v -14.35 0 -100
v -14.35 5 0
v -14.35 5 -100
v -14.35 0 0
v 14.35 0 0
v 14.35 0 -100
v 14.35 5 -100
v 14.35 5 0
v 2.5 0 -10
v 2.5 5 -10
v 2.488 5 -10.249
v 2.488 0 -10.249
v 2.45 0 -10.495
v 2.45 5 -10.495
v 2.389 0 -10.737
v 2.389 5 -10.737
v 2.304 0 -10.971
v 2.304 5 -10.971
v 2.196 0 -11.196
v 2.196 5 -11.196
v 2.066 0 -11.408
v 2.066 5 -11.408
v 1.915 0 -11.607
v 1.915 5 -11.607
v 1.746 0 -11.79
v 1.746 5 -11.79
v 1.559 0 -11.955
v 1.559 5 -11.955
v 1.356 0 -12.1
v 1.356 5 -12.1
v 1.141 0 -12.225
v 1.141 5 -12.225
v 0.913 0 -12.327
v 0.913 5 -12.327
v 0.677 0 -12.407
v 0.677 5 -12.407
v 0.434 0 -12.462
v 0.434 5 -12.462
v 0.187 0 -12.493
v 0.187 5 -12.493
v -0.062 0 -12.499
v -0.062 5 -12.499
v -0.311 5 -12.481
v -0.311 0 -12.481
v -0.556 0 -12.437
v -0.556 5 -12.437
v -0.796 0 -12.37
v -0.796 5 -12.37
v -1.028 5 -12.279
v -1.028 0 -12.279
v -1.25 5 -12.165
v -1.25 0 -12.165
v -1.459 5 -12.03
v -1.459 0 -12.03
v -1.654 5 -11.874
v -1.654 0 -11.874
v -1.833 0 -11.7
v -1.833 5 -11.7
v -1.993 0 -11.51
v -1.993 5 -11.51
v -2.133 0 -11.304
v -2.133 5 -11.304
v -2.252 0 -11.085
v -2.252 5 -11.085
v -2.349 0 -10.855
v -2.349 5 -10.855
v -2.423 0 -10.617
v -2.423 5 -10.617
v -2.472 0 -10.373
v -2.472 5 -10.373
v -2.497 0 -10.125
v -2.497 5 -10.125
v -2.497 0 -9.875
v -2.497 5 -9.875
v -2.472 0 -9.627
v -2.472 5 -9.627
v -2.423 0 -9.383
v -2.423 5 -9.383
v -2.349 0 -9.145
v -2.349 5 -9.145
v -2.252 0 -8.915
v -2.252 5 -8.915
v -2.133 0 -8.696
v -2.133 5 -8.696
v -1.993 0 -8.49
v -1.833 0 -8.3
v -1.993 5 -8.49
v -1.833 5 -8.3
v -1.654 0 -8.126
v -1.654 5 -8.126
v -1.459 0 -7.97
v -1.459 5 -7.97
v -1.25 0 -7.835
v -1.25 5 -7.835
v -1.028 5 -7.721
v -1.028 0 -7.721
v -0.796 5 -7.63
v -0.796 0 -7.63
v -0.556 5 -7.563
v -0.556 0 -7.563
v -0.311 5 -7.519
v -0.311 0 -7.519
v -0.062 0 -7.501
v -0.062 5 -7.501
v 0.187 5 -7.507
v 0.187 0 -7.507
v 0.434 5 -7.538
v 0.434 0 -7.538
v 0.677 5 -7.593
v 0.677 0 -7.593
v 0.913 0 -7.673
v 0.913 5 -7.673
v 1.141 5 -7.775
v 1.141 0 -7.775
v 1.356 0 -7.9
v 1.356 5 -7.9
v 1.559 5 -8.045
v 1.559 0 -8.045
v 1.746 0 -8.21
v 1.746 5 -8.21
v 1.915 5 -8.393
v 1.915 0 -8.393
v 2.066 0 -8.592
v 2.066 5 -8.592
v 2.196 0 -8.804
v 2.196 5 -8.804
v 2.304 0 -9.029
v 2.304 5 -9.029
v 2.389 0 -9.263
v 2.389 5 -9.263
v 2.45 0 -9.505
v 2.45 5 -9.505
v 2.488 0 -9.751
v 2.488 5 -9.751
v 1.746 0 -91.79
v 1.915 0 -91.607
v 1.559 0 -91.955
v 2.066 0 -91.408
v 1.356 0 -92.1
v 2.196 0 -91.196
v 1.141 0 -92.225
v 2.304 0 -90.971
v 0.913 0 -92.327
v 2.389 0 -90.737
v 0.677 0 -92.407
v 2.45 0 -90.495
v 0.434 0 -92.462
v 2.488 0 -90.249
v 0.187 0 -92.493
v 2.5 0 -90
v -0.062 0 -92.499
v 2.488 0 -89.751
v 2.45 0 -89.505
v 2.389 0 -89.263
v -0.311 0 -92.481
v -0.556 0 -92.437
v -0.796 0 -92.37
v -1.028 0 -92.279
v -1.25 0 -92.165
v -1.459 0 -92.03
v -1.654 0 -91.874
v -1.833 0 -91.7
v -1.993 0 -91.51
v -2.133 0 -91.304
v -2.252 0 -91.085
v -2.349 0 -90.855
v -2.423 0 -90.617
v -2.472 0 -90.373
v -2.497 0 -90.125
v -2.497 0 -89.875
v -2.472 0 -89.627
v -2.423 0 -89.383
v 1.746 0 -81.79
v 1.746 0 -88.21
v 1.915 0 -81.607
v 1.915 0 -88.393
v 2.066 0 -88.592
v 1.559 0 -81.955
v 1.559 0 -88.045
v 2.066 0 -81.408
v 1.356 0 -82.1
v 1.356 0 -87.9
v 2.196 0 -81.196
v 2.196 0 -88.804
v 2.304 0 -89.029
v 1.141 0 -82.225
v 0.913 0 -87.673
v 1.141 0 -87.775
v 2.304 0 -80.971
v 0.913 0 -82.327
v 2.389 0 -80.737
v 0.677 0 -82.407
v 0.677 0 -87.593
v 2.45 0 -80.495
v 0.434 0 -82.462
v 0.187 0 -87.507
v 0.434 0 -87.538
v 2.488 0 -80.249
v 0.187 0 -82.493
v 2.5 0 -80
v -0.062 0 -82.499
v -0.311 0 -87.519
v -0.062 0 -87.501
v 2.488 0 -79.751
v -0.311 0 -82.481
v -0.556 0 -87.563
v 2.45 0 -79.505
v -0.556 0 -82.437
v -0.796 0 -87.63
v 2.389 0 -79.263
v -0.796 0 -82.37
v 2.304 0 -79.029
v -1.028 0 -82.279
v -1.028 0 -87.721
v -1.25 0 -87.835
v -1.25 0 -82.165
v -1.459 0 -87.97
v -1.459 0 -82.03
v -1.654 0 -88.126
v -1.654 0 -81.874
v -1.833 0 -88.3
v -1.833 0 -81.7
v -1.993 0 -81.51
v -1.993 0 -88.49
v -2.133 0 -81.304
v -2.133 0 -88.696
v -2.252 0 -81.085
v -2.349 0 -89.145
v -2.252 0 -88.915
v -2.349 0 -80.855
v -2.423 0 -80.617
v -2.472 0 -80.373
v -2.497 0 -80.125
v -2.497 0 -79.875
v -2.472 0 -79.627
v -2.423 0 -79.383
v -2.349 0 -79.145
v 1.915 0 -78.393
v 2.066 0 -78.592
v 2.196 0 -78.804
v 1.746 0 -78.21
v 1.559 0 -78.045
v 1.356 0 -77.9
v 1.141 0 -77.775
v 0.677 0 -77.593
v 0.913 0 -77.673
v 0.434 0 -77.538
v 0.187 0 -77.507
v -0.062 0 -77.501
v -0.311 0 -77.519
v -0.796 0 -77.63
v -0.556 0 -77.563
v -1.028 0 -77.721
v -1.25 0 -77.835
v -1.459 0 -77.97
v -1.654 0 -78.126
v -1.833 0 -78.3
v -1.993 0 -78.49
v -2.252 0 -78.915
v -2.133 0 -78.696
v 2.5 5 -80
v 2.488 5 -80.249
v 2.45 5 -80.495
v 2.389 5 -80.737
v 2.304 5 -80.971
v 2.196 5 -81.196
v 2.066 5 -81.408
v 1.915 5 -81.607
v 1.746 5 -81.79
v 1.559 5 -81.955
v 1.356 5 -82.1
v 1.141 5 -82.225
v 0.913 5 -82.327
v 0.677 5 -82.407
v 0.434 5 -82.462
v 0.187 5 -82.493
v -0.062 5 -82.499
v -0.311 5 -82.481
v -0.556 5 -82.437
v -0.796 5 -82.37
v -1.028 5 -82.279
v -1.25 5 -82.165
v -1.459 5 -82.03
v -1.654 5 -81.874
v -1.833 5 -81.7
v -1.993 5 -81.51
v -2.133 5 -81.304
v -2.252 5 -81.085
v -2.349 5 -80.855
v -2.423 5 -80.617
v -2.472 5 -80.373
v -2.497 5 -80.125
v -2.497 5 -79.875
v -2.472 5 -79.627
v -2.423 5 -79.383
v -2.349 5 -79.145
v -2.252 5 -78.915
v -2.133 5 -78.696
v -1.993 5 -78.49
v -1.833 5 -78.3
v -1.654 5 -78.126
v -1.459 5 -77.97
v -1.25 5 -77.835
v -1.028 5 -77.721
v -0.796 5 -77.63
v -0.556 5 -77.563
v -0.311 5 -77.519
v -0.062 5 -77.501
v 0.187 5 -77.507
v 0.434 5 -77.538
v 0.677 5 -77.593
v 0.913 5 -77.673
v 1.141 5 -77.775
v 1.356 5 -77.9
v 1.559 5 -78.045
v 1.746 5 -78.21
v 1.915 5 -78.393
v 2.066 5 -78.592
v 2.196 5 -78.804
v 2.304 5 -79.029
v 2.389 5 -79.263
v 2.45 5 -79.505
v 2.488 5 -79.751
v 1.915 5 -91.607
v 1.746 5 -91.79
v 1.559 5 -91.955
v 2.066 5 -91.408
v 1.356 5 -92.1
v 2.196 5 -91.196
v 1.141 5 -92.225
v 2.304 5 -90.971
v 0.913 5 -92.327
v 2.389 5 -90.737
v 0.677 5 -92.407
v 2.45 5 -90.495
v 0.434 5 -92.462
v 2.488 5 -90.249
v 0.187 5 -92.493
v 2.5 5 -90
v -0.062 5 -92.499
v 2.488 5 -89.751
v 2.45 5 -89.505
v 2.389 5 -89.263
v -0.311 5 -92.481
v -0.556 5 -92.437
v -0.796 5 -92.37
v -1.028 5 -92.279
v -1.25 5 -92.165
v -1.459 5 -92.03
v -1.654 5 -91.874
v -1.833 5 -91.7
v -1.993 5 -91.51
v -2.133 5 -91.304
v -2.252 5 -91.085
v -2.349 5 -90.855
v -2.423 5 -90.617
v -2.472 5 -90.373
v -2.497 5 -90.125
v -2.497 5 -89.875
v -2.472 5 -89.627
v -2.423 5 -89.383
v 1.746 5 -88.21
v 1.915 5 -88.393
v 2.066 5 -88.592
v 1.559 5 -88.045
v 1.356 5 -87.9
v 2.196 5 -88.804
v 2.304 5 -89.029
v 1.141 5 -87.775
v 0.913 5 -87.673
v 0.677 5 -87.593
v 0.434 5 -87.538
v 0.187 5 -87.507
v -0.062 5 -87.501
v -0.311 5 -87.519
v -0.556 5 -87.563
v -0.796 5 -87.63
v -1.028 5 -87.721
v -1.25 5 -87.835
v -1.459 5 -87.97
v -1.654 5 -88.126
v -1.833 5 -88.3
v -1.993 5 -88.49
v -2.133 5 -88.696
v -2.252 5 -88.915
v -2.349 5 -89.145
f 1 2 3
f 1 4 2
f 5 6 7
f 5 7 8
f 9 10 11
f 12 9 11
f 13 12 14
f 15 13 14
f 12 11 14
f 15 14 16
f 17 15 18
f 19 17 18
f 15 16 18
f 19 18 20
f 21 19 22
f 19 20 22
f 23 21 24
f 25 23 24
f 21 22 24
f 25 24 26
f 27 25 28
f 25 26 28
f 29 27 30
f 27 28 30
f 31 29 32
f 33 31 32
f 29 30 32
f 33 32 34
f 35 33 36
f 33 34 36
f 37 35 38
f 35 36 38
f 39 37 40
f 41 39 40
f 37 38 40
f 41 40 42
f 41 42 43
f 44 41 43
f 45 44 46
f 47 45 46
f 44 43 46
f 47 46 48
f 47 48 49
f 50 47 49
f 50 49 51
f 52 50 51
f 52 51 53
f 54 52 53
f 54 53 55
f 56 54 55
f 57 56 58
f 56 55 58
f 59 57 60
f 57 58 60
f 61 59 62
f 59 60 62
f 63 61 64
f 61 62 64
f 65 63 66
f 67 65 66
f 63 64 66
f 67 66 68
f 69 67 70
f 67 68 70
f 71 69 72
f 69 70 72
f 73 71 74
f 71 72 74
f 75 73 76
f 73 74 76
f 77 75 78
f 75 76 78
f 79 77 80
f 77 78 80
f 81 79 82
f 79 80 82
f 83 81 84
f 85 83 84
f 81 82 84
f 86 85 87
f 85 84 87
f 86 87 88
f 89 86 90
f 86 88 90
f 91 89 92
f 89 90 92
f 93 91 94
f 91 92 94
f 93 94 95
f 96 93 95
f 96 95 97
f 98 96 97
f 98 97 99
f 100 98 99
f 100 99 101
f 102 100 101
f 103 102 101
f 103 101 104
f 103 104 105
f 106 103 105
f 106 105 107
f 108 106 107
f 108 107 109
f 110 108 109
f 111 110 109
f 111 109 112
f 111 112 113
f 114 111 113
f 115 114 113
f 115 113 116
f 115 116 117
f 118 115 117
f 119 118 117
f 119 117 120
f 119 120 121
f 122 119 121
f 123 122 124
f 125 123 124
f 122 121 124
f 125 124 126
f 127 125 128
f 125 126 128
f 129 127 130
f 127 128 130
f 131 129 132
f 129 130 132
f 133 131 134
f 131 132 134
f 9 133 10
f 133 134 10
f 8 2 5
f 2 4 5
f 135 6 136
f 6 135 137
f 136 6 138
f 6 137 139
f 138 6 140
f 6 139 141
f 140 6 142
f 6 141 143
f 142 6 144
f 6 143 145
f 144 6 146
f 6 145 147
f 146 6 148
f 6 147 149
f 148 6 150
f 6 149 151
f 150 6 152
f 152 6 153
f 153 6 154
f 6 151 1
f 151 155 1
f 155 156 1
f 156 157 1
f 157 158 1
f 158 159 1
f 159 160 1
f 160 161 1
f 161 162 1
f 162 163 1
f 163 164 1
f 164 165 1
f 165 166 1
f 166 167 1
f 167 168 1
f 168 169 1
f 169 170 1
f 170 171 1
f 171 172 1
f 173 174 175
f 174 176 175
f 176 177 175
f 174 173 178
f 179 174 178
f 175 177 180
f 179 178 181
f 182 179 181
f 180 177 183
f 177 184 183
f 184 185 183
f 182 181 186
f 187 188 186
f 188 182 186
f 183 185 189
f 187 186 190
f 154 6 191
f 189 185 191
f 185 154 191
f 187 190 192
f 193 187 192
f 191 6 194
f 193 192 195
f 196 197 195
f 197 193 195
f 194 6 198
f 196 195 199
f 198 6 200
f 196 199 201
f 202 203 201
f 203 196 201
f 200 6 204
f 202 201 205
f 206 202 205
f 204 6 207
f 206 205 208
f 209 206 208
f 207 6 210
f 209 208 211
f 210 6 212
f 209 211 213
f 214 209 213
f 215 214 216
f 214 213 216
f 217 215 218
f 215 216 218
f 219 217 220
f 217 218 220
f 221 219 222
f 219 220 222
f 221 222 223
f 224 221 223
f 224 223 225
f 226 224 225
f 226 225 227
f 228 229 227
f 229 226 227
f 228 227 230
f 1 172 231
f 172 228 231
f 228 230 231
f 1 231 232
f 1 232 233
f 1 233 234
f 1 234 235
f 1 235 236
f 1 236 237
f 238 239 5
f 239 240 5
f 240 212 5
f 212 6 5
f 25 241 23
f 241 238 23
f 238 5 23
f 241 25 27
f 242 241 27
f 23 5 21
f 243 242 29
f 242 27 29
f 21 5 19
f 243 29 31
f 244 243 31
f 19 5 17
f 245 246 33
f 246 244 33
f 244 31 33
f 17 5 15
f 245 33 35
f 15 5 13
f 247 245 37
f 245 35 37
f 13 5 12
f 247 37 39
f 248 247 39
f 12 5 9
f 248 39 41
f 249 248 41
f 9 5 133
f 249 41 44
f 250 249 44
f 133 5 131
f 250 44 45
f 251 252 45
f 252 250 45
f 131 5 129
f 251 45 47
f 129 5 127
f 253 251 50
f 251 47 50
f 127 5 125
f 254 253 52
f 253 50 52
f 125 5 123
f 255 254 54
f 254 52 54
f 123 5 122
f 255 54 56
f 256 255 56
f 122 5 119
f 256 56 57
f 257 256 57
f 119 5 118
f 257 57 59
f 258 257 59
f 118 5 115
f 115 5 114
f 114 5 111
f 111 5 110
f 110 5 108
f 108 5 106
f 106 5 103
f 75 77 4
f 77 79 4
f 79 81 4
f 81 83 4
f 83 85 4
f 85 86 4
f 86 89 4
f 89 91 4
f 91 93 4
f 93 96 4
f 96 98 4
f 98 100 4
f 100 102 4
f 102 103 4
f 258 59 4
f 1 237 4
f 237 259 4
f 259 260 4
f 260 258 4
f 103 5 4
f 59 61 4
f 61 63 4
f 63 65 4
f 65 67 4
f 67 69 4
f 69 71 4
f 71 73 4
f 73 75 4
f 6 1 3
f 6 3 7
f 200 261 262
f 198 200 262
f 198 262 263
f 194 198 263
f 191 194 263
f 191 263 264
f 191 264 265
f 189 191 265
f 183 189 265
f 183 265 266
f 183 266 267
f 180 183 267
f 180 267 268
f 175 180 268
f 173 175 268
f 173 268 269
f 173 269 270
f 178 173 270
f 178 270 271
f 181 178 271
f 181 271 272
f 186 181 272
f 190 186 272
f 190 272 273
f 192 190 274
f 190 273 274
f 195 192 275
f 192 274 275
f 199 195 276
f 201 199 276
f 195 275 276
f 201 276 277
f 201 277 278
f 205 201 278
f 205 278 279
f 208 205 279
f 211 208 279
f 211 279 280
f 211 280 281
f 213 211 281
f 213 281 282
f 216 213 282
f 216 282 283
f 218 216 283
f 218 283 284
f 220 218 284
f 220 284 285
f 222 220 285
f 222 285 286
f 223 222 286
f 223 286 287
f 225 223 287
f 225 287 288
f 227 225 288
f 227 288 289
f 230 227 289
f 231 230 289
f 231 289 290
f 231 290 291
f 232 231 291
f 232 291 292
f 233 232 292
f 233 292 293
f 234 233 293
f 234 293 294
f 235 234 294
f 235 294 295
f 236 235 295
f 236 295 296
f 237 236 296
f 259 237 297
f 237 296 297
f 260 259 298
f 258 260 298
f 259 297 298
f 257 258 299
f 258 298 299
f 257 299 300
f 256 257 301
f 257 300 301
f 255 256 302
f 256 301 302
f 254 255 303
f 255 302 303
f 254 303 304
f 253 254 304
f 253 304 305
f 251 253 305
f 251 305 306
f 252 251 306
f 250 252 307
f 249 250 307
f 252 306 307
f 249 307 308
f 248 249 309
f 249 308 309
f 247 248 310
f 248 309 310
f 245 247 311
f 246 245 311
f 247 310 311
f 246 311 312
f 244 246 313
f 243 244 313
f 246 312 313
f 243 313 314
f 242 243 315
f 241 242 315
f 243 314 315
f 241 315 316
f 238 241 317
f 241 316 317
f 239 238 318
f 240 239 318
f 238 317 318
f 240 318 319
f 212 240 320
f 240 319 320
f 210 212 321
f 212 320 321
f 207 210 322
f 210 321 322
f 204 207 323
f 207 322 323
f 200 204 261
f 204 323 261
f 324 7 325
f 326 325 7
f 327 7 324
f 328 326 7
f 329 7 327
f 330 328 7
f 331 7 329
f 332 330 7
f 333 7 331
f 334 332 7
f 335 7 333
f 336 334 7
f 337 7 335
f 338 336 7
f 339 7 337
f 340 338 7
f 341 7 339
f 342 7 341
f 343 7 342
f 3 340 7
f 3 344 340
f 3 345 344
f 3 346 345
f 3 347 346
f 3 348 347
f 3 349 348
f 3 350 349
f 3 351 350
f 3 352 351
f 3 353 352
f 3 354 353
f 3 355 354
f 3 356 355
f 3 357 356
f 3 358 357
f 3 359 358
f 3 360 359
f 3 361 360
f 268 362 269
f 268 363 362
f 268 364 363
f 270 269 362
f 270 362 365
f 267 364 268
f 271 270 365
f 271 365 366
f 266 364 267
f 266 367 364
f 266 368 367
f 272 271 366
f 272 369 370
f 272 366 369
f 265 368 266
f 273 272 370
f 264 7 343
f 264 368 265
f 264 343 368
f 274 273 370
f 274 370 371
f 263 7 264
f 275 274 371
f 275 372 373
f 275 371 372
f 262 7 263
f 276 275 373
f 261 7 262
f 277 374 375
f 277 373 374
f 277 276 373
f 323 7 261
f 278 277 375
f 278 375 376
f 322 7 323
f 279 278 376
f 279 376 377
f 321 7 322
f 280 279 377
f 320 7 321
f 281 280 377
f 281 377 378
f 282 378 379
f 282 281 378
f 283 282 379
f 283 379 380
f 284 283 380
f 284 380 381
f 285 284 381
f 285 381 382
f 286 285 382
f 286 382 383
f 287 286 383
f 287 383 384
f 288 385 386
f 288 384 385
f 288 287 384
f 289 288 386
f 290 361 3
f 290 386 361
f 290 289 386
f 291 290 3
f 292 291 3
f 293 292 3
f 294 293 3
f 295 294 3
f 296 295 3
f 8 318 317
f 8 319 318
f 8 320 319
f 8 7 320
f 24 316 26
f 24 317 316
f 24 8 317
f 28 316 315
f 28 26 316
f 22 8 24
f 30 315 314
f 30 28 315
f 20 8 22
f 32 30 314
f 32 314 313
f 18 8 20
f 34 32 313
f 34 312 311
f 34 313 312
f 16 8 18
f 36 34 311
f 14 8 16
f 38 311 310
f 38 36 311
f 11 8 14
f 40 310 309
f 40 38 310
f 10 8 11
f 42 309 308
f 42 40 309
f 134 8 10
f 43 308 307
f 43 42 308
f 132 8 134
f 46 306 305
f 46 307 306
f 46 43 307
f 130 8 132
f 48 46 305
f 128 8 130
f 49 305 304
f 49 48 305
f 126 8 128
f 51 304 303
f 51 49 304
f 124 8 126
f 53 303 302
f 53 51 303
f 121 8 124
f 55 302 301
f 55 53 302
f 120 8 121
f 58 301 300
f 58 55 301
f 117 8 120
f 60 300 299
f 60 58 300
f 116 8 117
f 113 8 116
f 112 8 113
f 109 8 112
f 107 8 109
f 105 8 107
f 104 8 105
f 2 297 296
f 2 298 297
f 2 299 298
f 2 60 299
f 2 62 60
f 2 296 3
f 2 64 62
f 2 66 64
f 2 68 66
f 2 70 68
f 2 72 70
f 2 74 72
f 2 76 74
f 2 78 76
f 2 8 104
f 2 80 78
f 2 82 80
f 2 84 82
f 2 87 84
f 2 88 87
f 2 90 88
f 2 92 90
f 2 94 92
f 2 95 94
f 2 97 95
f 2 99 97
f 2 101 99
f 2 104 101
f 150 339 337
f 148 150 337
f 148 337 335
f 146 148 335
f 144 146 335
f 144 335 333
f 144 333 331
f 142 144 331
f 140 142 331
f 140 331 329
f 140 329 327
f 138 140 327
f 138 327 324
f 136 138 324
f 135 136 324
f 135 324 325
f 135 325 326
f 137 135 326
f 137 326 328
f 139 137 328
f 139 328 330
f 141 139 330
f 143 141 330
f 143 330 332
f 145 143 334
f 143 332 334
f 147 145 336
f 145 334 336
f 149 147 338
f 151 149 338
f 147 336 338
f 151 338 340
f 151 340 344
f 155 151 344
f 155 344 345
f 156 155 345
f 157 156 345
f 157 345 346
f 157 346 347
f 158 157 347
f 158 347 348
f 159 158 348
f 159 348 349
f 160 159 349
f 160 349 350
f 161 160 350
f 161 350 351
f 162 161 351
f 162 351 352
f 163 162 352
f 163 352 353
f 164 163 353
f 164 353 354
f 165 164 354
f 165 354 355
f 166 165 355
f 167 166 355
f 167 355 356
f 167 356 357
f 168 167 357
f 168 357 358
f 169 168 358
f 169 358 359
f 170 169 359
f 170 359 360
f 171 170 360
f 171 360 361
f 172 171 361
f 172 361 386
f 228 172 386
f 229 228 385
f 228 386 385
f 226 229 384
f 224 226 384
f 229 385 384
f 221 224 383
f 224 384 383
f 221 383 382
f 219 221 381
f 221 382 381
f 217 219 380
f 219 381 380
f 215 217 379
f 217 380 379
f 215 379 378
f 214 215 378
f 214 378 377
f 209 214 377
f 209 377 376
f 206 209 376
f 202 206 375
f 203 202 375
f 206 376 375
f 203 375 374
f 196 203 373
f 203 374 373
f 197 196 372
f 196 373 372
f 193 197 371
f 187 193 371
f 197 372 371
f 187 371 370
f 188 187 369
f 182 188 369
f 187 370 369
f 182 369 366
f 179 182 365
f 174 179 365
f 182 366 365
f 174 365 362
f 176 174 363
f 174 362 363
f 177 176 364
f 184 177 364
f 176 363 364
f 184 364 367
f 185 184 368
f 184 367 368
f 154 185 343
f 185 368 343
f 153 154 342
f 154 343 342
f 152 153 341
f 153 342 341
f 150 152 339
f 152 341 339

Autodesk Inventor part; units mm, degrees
ref_plane "YZ Plane" through (0, 0, 0) normal (1, 0, 0) x (0, 1, 0)
ref_plane "XZ Plane" through (0, 0, 0) normal (0, 1, 0) x (-1, 0, 0)
ref_plane "XY Plane" through (0, 0, 0) normal (0, 0, 1) x (1, 0, 0)
sketch "Sketch1" plane through (0, 0, 0) normal (0, 1, 0) x (-1, 0, 0)
  line L0 (14.35, -100) -> (-14.35, -100)
  line L1 (14.35, 0) -> (14.35, -100)
  line L2 (14.35, 0) -> (-14.35, 0)
  line L3 (14.35, 0) -> (-14.35, 0)
  line L4 (-14.35, -100) -> (-14.35, 0)
  point P0 (0, 0)
extrude "Extrusion1" add sketch "Sketch1" along normal blind 5
sketch "Sketch2" plane through (0, 5, 0) normal (0, 1, 0) x (1, 0, 0)
  circle A0 centre (0, 80) radius 2.5
  circle A1 centre (0, 90) radius 2.5
  circle A2 centre (0, 10) radius 2.5
  point P0 (0, 0)
extrude "Extrusion2" cut sketch "Sketch2" against normal through all
properties part number "plat"
